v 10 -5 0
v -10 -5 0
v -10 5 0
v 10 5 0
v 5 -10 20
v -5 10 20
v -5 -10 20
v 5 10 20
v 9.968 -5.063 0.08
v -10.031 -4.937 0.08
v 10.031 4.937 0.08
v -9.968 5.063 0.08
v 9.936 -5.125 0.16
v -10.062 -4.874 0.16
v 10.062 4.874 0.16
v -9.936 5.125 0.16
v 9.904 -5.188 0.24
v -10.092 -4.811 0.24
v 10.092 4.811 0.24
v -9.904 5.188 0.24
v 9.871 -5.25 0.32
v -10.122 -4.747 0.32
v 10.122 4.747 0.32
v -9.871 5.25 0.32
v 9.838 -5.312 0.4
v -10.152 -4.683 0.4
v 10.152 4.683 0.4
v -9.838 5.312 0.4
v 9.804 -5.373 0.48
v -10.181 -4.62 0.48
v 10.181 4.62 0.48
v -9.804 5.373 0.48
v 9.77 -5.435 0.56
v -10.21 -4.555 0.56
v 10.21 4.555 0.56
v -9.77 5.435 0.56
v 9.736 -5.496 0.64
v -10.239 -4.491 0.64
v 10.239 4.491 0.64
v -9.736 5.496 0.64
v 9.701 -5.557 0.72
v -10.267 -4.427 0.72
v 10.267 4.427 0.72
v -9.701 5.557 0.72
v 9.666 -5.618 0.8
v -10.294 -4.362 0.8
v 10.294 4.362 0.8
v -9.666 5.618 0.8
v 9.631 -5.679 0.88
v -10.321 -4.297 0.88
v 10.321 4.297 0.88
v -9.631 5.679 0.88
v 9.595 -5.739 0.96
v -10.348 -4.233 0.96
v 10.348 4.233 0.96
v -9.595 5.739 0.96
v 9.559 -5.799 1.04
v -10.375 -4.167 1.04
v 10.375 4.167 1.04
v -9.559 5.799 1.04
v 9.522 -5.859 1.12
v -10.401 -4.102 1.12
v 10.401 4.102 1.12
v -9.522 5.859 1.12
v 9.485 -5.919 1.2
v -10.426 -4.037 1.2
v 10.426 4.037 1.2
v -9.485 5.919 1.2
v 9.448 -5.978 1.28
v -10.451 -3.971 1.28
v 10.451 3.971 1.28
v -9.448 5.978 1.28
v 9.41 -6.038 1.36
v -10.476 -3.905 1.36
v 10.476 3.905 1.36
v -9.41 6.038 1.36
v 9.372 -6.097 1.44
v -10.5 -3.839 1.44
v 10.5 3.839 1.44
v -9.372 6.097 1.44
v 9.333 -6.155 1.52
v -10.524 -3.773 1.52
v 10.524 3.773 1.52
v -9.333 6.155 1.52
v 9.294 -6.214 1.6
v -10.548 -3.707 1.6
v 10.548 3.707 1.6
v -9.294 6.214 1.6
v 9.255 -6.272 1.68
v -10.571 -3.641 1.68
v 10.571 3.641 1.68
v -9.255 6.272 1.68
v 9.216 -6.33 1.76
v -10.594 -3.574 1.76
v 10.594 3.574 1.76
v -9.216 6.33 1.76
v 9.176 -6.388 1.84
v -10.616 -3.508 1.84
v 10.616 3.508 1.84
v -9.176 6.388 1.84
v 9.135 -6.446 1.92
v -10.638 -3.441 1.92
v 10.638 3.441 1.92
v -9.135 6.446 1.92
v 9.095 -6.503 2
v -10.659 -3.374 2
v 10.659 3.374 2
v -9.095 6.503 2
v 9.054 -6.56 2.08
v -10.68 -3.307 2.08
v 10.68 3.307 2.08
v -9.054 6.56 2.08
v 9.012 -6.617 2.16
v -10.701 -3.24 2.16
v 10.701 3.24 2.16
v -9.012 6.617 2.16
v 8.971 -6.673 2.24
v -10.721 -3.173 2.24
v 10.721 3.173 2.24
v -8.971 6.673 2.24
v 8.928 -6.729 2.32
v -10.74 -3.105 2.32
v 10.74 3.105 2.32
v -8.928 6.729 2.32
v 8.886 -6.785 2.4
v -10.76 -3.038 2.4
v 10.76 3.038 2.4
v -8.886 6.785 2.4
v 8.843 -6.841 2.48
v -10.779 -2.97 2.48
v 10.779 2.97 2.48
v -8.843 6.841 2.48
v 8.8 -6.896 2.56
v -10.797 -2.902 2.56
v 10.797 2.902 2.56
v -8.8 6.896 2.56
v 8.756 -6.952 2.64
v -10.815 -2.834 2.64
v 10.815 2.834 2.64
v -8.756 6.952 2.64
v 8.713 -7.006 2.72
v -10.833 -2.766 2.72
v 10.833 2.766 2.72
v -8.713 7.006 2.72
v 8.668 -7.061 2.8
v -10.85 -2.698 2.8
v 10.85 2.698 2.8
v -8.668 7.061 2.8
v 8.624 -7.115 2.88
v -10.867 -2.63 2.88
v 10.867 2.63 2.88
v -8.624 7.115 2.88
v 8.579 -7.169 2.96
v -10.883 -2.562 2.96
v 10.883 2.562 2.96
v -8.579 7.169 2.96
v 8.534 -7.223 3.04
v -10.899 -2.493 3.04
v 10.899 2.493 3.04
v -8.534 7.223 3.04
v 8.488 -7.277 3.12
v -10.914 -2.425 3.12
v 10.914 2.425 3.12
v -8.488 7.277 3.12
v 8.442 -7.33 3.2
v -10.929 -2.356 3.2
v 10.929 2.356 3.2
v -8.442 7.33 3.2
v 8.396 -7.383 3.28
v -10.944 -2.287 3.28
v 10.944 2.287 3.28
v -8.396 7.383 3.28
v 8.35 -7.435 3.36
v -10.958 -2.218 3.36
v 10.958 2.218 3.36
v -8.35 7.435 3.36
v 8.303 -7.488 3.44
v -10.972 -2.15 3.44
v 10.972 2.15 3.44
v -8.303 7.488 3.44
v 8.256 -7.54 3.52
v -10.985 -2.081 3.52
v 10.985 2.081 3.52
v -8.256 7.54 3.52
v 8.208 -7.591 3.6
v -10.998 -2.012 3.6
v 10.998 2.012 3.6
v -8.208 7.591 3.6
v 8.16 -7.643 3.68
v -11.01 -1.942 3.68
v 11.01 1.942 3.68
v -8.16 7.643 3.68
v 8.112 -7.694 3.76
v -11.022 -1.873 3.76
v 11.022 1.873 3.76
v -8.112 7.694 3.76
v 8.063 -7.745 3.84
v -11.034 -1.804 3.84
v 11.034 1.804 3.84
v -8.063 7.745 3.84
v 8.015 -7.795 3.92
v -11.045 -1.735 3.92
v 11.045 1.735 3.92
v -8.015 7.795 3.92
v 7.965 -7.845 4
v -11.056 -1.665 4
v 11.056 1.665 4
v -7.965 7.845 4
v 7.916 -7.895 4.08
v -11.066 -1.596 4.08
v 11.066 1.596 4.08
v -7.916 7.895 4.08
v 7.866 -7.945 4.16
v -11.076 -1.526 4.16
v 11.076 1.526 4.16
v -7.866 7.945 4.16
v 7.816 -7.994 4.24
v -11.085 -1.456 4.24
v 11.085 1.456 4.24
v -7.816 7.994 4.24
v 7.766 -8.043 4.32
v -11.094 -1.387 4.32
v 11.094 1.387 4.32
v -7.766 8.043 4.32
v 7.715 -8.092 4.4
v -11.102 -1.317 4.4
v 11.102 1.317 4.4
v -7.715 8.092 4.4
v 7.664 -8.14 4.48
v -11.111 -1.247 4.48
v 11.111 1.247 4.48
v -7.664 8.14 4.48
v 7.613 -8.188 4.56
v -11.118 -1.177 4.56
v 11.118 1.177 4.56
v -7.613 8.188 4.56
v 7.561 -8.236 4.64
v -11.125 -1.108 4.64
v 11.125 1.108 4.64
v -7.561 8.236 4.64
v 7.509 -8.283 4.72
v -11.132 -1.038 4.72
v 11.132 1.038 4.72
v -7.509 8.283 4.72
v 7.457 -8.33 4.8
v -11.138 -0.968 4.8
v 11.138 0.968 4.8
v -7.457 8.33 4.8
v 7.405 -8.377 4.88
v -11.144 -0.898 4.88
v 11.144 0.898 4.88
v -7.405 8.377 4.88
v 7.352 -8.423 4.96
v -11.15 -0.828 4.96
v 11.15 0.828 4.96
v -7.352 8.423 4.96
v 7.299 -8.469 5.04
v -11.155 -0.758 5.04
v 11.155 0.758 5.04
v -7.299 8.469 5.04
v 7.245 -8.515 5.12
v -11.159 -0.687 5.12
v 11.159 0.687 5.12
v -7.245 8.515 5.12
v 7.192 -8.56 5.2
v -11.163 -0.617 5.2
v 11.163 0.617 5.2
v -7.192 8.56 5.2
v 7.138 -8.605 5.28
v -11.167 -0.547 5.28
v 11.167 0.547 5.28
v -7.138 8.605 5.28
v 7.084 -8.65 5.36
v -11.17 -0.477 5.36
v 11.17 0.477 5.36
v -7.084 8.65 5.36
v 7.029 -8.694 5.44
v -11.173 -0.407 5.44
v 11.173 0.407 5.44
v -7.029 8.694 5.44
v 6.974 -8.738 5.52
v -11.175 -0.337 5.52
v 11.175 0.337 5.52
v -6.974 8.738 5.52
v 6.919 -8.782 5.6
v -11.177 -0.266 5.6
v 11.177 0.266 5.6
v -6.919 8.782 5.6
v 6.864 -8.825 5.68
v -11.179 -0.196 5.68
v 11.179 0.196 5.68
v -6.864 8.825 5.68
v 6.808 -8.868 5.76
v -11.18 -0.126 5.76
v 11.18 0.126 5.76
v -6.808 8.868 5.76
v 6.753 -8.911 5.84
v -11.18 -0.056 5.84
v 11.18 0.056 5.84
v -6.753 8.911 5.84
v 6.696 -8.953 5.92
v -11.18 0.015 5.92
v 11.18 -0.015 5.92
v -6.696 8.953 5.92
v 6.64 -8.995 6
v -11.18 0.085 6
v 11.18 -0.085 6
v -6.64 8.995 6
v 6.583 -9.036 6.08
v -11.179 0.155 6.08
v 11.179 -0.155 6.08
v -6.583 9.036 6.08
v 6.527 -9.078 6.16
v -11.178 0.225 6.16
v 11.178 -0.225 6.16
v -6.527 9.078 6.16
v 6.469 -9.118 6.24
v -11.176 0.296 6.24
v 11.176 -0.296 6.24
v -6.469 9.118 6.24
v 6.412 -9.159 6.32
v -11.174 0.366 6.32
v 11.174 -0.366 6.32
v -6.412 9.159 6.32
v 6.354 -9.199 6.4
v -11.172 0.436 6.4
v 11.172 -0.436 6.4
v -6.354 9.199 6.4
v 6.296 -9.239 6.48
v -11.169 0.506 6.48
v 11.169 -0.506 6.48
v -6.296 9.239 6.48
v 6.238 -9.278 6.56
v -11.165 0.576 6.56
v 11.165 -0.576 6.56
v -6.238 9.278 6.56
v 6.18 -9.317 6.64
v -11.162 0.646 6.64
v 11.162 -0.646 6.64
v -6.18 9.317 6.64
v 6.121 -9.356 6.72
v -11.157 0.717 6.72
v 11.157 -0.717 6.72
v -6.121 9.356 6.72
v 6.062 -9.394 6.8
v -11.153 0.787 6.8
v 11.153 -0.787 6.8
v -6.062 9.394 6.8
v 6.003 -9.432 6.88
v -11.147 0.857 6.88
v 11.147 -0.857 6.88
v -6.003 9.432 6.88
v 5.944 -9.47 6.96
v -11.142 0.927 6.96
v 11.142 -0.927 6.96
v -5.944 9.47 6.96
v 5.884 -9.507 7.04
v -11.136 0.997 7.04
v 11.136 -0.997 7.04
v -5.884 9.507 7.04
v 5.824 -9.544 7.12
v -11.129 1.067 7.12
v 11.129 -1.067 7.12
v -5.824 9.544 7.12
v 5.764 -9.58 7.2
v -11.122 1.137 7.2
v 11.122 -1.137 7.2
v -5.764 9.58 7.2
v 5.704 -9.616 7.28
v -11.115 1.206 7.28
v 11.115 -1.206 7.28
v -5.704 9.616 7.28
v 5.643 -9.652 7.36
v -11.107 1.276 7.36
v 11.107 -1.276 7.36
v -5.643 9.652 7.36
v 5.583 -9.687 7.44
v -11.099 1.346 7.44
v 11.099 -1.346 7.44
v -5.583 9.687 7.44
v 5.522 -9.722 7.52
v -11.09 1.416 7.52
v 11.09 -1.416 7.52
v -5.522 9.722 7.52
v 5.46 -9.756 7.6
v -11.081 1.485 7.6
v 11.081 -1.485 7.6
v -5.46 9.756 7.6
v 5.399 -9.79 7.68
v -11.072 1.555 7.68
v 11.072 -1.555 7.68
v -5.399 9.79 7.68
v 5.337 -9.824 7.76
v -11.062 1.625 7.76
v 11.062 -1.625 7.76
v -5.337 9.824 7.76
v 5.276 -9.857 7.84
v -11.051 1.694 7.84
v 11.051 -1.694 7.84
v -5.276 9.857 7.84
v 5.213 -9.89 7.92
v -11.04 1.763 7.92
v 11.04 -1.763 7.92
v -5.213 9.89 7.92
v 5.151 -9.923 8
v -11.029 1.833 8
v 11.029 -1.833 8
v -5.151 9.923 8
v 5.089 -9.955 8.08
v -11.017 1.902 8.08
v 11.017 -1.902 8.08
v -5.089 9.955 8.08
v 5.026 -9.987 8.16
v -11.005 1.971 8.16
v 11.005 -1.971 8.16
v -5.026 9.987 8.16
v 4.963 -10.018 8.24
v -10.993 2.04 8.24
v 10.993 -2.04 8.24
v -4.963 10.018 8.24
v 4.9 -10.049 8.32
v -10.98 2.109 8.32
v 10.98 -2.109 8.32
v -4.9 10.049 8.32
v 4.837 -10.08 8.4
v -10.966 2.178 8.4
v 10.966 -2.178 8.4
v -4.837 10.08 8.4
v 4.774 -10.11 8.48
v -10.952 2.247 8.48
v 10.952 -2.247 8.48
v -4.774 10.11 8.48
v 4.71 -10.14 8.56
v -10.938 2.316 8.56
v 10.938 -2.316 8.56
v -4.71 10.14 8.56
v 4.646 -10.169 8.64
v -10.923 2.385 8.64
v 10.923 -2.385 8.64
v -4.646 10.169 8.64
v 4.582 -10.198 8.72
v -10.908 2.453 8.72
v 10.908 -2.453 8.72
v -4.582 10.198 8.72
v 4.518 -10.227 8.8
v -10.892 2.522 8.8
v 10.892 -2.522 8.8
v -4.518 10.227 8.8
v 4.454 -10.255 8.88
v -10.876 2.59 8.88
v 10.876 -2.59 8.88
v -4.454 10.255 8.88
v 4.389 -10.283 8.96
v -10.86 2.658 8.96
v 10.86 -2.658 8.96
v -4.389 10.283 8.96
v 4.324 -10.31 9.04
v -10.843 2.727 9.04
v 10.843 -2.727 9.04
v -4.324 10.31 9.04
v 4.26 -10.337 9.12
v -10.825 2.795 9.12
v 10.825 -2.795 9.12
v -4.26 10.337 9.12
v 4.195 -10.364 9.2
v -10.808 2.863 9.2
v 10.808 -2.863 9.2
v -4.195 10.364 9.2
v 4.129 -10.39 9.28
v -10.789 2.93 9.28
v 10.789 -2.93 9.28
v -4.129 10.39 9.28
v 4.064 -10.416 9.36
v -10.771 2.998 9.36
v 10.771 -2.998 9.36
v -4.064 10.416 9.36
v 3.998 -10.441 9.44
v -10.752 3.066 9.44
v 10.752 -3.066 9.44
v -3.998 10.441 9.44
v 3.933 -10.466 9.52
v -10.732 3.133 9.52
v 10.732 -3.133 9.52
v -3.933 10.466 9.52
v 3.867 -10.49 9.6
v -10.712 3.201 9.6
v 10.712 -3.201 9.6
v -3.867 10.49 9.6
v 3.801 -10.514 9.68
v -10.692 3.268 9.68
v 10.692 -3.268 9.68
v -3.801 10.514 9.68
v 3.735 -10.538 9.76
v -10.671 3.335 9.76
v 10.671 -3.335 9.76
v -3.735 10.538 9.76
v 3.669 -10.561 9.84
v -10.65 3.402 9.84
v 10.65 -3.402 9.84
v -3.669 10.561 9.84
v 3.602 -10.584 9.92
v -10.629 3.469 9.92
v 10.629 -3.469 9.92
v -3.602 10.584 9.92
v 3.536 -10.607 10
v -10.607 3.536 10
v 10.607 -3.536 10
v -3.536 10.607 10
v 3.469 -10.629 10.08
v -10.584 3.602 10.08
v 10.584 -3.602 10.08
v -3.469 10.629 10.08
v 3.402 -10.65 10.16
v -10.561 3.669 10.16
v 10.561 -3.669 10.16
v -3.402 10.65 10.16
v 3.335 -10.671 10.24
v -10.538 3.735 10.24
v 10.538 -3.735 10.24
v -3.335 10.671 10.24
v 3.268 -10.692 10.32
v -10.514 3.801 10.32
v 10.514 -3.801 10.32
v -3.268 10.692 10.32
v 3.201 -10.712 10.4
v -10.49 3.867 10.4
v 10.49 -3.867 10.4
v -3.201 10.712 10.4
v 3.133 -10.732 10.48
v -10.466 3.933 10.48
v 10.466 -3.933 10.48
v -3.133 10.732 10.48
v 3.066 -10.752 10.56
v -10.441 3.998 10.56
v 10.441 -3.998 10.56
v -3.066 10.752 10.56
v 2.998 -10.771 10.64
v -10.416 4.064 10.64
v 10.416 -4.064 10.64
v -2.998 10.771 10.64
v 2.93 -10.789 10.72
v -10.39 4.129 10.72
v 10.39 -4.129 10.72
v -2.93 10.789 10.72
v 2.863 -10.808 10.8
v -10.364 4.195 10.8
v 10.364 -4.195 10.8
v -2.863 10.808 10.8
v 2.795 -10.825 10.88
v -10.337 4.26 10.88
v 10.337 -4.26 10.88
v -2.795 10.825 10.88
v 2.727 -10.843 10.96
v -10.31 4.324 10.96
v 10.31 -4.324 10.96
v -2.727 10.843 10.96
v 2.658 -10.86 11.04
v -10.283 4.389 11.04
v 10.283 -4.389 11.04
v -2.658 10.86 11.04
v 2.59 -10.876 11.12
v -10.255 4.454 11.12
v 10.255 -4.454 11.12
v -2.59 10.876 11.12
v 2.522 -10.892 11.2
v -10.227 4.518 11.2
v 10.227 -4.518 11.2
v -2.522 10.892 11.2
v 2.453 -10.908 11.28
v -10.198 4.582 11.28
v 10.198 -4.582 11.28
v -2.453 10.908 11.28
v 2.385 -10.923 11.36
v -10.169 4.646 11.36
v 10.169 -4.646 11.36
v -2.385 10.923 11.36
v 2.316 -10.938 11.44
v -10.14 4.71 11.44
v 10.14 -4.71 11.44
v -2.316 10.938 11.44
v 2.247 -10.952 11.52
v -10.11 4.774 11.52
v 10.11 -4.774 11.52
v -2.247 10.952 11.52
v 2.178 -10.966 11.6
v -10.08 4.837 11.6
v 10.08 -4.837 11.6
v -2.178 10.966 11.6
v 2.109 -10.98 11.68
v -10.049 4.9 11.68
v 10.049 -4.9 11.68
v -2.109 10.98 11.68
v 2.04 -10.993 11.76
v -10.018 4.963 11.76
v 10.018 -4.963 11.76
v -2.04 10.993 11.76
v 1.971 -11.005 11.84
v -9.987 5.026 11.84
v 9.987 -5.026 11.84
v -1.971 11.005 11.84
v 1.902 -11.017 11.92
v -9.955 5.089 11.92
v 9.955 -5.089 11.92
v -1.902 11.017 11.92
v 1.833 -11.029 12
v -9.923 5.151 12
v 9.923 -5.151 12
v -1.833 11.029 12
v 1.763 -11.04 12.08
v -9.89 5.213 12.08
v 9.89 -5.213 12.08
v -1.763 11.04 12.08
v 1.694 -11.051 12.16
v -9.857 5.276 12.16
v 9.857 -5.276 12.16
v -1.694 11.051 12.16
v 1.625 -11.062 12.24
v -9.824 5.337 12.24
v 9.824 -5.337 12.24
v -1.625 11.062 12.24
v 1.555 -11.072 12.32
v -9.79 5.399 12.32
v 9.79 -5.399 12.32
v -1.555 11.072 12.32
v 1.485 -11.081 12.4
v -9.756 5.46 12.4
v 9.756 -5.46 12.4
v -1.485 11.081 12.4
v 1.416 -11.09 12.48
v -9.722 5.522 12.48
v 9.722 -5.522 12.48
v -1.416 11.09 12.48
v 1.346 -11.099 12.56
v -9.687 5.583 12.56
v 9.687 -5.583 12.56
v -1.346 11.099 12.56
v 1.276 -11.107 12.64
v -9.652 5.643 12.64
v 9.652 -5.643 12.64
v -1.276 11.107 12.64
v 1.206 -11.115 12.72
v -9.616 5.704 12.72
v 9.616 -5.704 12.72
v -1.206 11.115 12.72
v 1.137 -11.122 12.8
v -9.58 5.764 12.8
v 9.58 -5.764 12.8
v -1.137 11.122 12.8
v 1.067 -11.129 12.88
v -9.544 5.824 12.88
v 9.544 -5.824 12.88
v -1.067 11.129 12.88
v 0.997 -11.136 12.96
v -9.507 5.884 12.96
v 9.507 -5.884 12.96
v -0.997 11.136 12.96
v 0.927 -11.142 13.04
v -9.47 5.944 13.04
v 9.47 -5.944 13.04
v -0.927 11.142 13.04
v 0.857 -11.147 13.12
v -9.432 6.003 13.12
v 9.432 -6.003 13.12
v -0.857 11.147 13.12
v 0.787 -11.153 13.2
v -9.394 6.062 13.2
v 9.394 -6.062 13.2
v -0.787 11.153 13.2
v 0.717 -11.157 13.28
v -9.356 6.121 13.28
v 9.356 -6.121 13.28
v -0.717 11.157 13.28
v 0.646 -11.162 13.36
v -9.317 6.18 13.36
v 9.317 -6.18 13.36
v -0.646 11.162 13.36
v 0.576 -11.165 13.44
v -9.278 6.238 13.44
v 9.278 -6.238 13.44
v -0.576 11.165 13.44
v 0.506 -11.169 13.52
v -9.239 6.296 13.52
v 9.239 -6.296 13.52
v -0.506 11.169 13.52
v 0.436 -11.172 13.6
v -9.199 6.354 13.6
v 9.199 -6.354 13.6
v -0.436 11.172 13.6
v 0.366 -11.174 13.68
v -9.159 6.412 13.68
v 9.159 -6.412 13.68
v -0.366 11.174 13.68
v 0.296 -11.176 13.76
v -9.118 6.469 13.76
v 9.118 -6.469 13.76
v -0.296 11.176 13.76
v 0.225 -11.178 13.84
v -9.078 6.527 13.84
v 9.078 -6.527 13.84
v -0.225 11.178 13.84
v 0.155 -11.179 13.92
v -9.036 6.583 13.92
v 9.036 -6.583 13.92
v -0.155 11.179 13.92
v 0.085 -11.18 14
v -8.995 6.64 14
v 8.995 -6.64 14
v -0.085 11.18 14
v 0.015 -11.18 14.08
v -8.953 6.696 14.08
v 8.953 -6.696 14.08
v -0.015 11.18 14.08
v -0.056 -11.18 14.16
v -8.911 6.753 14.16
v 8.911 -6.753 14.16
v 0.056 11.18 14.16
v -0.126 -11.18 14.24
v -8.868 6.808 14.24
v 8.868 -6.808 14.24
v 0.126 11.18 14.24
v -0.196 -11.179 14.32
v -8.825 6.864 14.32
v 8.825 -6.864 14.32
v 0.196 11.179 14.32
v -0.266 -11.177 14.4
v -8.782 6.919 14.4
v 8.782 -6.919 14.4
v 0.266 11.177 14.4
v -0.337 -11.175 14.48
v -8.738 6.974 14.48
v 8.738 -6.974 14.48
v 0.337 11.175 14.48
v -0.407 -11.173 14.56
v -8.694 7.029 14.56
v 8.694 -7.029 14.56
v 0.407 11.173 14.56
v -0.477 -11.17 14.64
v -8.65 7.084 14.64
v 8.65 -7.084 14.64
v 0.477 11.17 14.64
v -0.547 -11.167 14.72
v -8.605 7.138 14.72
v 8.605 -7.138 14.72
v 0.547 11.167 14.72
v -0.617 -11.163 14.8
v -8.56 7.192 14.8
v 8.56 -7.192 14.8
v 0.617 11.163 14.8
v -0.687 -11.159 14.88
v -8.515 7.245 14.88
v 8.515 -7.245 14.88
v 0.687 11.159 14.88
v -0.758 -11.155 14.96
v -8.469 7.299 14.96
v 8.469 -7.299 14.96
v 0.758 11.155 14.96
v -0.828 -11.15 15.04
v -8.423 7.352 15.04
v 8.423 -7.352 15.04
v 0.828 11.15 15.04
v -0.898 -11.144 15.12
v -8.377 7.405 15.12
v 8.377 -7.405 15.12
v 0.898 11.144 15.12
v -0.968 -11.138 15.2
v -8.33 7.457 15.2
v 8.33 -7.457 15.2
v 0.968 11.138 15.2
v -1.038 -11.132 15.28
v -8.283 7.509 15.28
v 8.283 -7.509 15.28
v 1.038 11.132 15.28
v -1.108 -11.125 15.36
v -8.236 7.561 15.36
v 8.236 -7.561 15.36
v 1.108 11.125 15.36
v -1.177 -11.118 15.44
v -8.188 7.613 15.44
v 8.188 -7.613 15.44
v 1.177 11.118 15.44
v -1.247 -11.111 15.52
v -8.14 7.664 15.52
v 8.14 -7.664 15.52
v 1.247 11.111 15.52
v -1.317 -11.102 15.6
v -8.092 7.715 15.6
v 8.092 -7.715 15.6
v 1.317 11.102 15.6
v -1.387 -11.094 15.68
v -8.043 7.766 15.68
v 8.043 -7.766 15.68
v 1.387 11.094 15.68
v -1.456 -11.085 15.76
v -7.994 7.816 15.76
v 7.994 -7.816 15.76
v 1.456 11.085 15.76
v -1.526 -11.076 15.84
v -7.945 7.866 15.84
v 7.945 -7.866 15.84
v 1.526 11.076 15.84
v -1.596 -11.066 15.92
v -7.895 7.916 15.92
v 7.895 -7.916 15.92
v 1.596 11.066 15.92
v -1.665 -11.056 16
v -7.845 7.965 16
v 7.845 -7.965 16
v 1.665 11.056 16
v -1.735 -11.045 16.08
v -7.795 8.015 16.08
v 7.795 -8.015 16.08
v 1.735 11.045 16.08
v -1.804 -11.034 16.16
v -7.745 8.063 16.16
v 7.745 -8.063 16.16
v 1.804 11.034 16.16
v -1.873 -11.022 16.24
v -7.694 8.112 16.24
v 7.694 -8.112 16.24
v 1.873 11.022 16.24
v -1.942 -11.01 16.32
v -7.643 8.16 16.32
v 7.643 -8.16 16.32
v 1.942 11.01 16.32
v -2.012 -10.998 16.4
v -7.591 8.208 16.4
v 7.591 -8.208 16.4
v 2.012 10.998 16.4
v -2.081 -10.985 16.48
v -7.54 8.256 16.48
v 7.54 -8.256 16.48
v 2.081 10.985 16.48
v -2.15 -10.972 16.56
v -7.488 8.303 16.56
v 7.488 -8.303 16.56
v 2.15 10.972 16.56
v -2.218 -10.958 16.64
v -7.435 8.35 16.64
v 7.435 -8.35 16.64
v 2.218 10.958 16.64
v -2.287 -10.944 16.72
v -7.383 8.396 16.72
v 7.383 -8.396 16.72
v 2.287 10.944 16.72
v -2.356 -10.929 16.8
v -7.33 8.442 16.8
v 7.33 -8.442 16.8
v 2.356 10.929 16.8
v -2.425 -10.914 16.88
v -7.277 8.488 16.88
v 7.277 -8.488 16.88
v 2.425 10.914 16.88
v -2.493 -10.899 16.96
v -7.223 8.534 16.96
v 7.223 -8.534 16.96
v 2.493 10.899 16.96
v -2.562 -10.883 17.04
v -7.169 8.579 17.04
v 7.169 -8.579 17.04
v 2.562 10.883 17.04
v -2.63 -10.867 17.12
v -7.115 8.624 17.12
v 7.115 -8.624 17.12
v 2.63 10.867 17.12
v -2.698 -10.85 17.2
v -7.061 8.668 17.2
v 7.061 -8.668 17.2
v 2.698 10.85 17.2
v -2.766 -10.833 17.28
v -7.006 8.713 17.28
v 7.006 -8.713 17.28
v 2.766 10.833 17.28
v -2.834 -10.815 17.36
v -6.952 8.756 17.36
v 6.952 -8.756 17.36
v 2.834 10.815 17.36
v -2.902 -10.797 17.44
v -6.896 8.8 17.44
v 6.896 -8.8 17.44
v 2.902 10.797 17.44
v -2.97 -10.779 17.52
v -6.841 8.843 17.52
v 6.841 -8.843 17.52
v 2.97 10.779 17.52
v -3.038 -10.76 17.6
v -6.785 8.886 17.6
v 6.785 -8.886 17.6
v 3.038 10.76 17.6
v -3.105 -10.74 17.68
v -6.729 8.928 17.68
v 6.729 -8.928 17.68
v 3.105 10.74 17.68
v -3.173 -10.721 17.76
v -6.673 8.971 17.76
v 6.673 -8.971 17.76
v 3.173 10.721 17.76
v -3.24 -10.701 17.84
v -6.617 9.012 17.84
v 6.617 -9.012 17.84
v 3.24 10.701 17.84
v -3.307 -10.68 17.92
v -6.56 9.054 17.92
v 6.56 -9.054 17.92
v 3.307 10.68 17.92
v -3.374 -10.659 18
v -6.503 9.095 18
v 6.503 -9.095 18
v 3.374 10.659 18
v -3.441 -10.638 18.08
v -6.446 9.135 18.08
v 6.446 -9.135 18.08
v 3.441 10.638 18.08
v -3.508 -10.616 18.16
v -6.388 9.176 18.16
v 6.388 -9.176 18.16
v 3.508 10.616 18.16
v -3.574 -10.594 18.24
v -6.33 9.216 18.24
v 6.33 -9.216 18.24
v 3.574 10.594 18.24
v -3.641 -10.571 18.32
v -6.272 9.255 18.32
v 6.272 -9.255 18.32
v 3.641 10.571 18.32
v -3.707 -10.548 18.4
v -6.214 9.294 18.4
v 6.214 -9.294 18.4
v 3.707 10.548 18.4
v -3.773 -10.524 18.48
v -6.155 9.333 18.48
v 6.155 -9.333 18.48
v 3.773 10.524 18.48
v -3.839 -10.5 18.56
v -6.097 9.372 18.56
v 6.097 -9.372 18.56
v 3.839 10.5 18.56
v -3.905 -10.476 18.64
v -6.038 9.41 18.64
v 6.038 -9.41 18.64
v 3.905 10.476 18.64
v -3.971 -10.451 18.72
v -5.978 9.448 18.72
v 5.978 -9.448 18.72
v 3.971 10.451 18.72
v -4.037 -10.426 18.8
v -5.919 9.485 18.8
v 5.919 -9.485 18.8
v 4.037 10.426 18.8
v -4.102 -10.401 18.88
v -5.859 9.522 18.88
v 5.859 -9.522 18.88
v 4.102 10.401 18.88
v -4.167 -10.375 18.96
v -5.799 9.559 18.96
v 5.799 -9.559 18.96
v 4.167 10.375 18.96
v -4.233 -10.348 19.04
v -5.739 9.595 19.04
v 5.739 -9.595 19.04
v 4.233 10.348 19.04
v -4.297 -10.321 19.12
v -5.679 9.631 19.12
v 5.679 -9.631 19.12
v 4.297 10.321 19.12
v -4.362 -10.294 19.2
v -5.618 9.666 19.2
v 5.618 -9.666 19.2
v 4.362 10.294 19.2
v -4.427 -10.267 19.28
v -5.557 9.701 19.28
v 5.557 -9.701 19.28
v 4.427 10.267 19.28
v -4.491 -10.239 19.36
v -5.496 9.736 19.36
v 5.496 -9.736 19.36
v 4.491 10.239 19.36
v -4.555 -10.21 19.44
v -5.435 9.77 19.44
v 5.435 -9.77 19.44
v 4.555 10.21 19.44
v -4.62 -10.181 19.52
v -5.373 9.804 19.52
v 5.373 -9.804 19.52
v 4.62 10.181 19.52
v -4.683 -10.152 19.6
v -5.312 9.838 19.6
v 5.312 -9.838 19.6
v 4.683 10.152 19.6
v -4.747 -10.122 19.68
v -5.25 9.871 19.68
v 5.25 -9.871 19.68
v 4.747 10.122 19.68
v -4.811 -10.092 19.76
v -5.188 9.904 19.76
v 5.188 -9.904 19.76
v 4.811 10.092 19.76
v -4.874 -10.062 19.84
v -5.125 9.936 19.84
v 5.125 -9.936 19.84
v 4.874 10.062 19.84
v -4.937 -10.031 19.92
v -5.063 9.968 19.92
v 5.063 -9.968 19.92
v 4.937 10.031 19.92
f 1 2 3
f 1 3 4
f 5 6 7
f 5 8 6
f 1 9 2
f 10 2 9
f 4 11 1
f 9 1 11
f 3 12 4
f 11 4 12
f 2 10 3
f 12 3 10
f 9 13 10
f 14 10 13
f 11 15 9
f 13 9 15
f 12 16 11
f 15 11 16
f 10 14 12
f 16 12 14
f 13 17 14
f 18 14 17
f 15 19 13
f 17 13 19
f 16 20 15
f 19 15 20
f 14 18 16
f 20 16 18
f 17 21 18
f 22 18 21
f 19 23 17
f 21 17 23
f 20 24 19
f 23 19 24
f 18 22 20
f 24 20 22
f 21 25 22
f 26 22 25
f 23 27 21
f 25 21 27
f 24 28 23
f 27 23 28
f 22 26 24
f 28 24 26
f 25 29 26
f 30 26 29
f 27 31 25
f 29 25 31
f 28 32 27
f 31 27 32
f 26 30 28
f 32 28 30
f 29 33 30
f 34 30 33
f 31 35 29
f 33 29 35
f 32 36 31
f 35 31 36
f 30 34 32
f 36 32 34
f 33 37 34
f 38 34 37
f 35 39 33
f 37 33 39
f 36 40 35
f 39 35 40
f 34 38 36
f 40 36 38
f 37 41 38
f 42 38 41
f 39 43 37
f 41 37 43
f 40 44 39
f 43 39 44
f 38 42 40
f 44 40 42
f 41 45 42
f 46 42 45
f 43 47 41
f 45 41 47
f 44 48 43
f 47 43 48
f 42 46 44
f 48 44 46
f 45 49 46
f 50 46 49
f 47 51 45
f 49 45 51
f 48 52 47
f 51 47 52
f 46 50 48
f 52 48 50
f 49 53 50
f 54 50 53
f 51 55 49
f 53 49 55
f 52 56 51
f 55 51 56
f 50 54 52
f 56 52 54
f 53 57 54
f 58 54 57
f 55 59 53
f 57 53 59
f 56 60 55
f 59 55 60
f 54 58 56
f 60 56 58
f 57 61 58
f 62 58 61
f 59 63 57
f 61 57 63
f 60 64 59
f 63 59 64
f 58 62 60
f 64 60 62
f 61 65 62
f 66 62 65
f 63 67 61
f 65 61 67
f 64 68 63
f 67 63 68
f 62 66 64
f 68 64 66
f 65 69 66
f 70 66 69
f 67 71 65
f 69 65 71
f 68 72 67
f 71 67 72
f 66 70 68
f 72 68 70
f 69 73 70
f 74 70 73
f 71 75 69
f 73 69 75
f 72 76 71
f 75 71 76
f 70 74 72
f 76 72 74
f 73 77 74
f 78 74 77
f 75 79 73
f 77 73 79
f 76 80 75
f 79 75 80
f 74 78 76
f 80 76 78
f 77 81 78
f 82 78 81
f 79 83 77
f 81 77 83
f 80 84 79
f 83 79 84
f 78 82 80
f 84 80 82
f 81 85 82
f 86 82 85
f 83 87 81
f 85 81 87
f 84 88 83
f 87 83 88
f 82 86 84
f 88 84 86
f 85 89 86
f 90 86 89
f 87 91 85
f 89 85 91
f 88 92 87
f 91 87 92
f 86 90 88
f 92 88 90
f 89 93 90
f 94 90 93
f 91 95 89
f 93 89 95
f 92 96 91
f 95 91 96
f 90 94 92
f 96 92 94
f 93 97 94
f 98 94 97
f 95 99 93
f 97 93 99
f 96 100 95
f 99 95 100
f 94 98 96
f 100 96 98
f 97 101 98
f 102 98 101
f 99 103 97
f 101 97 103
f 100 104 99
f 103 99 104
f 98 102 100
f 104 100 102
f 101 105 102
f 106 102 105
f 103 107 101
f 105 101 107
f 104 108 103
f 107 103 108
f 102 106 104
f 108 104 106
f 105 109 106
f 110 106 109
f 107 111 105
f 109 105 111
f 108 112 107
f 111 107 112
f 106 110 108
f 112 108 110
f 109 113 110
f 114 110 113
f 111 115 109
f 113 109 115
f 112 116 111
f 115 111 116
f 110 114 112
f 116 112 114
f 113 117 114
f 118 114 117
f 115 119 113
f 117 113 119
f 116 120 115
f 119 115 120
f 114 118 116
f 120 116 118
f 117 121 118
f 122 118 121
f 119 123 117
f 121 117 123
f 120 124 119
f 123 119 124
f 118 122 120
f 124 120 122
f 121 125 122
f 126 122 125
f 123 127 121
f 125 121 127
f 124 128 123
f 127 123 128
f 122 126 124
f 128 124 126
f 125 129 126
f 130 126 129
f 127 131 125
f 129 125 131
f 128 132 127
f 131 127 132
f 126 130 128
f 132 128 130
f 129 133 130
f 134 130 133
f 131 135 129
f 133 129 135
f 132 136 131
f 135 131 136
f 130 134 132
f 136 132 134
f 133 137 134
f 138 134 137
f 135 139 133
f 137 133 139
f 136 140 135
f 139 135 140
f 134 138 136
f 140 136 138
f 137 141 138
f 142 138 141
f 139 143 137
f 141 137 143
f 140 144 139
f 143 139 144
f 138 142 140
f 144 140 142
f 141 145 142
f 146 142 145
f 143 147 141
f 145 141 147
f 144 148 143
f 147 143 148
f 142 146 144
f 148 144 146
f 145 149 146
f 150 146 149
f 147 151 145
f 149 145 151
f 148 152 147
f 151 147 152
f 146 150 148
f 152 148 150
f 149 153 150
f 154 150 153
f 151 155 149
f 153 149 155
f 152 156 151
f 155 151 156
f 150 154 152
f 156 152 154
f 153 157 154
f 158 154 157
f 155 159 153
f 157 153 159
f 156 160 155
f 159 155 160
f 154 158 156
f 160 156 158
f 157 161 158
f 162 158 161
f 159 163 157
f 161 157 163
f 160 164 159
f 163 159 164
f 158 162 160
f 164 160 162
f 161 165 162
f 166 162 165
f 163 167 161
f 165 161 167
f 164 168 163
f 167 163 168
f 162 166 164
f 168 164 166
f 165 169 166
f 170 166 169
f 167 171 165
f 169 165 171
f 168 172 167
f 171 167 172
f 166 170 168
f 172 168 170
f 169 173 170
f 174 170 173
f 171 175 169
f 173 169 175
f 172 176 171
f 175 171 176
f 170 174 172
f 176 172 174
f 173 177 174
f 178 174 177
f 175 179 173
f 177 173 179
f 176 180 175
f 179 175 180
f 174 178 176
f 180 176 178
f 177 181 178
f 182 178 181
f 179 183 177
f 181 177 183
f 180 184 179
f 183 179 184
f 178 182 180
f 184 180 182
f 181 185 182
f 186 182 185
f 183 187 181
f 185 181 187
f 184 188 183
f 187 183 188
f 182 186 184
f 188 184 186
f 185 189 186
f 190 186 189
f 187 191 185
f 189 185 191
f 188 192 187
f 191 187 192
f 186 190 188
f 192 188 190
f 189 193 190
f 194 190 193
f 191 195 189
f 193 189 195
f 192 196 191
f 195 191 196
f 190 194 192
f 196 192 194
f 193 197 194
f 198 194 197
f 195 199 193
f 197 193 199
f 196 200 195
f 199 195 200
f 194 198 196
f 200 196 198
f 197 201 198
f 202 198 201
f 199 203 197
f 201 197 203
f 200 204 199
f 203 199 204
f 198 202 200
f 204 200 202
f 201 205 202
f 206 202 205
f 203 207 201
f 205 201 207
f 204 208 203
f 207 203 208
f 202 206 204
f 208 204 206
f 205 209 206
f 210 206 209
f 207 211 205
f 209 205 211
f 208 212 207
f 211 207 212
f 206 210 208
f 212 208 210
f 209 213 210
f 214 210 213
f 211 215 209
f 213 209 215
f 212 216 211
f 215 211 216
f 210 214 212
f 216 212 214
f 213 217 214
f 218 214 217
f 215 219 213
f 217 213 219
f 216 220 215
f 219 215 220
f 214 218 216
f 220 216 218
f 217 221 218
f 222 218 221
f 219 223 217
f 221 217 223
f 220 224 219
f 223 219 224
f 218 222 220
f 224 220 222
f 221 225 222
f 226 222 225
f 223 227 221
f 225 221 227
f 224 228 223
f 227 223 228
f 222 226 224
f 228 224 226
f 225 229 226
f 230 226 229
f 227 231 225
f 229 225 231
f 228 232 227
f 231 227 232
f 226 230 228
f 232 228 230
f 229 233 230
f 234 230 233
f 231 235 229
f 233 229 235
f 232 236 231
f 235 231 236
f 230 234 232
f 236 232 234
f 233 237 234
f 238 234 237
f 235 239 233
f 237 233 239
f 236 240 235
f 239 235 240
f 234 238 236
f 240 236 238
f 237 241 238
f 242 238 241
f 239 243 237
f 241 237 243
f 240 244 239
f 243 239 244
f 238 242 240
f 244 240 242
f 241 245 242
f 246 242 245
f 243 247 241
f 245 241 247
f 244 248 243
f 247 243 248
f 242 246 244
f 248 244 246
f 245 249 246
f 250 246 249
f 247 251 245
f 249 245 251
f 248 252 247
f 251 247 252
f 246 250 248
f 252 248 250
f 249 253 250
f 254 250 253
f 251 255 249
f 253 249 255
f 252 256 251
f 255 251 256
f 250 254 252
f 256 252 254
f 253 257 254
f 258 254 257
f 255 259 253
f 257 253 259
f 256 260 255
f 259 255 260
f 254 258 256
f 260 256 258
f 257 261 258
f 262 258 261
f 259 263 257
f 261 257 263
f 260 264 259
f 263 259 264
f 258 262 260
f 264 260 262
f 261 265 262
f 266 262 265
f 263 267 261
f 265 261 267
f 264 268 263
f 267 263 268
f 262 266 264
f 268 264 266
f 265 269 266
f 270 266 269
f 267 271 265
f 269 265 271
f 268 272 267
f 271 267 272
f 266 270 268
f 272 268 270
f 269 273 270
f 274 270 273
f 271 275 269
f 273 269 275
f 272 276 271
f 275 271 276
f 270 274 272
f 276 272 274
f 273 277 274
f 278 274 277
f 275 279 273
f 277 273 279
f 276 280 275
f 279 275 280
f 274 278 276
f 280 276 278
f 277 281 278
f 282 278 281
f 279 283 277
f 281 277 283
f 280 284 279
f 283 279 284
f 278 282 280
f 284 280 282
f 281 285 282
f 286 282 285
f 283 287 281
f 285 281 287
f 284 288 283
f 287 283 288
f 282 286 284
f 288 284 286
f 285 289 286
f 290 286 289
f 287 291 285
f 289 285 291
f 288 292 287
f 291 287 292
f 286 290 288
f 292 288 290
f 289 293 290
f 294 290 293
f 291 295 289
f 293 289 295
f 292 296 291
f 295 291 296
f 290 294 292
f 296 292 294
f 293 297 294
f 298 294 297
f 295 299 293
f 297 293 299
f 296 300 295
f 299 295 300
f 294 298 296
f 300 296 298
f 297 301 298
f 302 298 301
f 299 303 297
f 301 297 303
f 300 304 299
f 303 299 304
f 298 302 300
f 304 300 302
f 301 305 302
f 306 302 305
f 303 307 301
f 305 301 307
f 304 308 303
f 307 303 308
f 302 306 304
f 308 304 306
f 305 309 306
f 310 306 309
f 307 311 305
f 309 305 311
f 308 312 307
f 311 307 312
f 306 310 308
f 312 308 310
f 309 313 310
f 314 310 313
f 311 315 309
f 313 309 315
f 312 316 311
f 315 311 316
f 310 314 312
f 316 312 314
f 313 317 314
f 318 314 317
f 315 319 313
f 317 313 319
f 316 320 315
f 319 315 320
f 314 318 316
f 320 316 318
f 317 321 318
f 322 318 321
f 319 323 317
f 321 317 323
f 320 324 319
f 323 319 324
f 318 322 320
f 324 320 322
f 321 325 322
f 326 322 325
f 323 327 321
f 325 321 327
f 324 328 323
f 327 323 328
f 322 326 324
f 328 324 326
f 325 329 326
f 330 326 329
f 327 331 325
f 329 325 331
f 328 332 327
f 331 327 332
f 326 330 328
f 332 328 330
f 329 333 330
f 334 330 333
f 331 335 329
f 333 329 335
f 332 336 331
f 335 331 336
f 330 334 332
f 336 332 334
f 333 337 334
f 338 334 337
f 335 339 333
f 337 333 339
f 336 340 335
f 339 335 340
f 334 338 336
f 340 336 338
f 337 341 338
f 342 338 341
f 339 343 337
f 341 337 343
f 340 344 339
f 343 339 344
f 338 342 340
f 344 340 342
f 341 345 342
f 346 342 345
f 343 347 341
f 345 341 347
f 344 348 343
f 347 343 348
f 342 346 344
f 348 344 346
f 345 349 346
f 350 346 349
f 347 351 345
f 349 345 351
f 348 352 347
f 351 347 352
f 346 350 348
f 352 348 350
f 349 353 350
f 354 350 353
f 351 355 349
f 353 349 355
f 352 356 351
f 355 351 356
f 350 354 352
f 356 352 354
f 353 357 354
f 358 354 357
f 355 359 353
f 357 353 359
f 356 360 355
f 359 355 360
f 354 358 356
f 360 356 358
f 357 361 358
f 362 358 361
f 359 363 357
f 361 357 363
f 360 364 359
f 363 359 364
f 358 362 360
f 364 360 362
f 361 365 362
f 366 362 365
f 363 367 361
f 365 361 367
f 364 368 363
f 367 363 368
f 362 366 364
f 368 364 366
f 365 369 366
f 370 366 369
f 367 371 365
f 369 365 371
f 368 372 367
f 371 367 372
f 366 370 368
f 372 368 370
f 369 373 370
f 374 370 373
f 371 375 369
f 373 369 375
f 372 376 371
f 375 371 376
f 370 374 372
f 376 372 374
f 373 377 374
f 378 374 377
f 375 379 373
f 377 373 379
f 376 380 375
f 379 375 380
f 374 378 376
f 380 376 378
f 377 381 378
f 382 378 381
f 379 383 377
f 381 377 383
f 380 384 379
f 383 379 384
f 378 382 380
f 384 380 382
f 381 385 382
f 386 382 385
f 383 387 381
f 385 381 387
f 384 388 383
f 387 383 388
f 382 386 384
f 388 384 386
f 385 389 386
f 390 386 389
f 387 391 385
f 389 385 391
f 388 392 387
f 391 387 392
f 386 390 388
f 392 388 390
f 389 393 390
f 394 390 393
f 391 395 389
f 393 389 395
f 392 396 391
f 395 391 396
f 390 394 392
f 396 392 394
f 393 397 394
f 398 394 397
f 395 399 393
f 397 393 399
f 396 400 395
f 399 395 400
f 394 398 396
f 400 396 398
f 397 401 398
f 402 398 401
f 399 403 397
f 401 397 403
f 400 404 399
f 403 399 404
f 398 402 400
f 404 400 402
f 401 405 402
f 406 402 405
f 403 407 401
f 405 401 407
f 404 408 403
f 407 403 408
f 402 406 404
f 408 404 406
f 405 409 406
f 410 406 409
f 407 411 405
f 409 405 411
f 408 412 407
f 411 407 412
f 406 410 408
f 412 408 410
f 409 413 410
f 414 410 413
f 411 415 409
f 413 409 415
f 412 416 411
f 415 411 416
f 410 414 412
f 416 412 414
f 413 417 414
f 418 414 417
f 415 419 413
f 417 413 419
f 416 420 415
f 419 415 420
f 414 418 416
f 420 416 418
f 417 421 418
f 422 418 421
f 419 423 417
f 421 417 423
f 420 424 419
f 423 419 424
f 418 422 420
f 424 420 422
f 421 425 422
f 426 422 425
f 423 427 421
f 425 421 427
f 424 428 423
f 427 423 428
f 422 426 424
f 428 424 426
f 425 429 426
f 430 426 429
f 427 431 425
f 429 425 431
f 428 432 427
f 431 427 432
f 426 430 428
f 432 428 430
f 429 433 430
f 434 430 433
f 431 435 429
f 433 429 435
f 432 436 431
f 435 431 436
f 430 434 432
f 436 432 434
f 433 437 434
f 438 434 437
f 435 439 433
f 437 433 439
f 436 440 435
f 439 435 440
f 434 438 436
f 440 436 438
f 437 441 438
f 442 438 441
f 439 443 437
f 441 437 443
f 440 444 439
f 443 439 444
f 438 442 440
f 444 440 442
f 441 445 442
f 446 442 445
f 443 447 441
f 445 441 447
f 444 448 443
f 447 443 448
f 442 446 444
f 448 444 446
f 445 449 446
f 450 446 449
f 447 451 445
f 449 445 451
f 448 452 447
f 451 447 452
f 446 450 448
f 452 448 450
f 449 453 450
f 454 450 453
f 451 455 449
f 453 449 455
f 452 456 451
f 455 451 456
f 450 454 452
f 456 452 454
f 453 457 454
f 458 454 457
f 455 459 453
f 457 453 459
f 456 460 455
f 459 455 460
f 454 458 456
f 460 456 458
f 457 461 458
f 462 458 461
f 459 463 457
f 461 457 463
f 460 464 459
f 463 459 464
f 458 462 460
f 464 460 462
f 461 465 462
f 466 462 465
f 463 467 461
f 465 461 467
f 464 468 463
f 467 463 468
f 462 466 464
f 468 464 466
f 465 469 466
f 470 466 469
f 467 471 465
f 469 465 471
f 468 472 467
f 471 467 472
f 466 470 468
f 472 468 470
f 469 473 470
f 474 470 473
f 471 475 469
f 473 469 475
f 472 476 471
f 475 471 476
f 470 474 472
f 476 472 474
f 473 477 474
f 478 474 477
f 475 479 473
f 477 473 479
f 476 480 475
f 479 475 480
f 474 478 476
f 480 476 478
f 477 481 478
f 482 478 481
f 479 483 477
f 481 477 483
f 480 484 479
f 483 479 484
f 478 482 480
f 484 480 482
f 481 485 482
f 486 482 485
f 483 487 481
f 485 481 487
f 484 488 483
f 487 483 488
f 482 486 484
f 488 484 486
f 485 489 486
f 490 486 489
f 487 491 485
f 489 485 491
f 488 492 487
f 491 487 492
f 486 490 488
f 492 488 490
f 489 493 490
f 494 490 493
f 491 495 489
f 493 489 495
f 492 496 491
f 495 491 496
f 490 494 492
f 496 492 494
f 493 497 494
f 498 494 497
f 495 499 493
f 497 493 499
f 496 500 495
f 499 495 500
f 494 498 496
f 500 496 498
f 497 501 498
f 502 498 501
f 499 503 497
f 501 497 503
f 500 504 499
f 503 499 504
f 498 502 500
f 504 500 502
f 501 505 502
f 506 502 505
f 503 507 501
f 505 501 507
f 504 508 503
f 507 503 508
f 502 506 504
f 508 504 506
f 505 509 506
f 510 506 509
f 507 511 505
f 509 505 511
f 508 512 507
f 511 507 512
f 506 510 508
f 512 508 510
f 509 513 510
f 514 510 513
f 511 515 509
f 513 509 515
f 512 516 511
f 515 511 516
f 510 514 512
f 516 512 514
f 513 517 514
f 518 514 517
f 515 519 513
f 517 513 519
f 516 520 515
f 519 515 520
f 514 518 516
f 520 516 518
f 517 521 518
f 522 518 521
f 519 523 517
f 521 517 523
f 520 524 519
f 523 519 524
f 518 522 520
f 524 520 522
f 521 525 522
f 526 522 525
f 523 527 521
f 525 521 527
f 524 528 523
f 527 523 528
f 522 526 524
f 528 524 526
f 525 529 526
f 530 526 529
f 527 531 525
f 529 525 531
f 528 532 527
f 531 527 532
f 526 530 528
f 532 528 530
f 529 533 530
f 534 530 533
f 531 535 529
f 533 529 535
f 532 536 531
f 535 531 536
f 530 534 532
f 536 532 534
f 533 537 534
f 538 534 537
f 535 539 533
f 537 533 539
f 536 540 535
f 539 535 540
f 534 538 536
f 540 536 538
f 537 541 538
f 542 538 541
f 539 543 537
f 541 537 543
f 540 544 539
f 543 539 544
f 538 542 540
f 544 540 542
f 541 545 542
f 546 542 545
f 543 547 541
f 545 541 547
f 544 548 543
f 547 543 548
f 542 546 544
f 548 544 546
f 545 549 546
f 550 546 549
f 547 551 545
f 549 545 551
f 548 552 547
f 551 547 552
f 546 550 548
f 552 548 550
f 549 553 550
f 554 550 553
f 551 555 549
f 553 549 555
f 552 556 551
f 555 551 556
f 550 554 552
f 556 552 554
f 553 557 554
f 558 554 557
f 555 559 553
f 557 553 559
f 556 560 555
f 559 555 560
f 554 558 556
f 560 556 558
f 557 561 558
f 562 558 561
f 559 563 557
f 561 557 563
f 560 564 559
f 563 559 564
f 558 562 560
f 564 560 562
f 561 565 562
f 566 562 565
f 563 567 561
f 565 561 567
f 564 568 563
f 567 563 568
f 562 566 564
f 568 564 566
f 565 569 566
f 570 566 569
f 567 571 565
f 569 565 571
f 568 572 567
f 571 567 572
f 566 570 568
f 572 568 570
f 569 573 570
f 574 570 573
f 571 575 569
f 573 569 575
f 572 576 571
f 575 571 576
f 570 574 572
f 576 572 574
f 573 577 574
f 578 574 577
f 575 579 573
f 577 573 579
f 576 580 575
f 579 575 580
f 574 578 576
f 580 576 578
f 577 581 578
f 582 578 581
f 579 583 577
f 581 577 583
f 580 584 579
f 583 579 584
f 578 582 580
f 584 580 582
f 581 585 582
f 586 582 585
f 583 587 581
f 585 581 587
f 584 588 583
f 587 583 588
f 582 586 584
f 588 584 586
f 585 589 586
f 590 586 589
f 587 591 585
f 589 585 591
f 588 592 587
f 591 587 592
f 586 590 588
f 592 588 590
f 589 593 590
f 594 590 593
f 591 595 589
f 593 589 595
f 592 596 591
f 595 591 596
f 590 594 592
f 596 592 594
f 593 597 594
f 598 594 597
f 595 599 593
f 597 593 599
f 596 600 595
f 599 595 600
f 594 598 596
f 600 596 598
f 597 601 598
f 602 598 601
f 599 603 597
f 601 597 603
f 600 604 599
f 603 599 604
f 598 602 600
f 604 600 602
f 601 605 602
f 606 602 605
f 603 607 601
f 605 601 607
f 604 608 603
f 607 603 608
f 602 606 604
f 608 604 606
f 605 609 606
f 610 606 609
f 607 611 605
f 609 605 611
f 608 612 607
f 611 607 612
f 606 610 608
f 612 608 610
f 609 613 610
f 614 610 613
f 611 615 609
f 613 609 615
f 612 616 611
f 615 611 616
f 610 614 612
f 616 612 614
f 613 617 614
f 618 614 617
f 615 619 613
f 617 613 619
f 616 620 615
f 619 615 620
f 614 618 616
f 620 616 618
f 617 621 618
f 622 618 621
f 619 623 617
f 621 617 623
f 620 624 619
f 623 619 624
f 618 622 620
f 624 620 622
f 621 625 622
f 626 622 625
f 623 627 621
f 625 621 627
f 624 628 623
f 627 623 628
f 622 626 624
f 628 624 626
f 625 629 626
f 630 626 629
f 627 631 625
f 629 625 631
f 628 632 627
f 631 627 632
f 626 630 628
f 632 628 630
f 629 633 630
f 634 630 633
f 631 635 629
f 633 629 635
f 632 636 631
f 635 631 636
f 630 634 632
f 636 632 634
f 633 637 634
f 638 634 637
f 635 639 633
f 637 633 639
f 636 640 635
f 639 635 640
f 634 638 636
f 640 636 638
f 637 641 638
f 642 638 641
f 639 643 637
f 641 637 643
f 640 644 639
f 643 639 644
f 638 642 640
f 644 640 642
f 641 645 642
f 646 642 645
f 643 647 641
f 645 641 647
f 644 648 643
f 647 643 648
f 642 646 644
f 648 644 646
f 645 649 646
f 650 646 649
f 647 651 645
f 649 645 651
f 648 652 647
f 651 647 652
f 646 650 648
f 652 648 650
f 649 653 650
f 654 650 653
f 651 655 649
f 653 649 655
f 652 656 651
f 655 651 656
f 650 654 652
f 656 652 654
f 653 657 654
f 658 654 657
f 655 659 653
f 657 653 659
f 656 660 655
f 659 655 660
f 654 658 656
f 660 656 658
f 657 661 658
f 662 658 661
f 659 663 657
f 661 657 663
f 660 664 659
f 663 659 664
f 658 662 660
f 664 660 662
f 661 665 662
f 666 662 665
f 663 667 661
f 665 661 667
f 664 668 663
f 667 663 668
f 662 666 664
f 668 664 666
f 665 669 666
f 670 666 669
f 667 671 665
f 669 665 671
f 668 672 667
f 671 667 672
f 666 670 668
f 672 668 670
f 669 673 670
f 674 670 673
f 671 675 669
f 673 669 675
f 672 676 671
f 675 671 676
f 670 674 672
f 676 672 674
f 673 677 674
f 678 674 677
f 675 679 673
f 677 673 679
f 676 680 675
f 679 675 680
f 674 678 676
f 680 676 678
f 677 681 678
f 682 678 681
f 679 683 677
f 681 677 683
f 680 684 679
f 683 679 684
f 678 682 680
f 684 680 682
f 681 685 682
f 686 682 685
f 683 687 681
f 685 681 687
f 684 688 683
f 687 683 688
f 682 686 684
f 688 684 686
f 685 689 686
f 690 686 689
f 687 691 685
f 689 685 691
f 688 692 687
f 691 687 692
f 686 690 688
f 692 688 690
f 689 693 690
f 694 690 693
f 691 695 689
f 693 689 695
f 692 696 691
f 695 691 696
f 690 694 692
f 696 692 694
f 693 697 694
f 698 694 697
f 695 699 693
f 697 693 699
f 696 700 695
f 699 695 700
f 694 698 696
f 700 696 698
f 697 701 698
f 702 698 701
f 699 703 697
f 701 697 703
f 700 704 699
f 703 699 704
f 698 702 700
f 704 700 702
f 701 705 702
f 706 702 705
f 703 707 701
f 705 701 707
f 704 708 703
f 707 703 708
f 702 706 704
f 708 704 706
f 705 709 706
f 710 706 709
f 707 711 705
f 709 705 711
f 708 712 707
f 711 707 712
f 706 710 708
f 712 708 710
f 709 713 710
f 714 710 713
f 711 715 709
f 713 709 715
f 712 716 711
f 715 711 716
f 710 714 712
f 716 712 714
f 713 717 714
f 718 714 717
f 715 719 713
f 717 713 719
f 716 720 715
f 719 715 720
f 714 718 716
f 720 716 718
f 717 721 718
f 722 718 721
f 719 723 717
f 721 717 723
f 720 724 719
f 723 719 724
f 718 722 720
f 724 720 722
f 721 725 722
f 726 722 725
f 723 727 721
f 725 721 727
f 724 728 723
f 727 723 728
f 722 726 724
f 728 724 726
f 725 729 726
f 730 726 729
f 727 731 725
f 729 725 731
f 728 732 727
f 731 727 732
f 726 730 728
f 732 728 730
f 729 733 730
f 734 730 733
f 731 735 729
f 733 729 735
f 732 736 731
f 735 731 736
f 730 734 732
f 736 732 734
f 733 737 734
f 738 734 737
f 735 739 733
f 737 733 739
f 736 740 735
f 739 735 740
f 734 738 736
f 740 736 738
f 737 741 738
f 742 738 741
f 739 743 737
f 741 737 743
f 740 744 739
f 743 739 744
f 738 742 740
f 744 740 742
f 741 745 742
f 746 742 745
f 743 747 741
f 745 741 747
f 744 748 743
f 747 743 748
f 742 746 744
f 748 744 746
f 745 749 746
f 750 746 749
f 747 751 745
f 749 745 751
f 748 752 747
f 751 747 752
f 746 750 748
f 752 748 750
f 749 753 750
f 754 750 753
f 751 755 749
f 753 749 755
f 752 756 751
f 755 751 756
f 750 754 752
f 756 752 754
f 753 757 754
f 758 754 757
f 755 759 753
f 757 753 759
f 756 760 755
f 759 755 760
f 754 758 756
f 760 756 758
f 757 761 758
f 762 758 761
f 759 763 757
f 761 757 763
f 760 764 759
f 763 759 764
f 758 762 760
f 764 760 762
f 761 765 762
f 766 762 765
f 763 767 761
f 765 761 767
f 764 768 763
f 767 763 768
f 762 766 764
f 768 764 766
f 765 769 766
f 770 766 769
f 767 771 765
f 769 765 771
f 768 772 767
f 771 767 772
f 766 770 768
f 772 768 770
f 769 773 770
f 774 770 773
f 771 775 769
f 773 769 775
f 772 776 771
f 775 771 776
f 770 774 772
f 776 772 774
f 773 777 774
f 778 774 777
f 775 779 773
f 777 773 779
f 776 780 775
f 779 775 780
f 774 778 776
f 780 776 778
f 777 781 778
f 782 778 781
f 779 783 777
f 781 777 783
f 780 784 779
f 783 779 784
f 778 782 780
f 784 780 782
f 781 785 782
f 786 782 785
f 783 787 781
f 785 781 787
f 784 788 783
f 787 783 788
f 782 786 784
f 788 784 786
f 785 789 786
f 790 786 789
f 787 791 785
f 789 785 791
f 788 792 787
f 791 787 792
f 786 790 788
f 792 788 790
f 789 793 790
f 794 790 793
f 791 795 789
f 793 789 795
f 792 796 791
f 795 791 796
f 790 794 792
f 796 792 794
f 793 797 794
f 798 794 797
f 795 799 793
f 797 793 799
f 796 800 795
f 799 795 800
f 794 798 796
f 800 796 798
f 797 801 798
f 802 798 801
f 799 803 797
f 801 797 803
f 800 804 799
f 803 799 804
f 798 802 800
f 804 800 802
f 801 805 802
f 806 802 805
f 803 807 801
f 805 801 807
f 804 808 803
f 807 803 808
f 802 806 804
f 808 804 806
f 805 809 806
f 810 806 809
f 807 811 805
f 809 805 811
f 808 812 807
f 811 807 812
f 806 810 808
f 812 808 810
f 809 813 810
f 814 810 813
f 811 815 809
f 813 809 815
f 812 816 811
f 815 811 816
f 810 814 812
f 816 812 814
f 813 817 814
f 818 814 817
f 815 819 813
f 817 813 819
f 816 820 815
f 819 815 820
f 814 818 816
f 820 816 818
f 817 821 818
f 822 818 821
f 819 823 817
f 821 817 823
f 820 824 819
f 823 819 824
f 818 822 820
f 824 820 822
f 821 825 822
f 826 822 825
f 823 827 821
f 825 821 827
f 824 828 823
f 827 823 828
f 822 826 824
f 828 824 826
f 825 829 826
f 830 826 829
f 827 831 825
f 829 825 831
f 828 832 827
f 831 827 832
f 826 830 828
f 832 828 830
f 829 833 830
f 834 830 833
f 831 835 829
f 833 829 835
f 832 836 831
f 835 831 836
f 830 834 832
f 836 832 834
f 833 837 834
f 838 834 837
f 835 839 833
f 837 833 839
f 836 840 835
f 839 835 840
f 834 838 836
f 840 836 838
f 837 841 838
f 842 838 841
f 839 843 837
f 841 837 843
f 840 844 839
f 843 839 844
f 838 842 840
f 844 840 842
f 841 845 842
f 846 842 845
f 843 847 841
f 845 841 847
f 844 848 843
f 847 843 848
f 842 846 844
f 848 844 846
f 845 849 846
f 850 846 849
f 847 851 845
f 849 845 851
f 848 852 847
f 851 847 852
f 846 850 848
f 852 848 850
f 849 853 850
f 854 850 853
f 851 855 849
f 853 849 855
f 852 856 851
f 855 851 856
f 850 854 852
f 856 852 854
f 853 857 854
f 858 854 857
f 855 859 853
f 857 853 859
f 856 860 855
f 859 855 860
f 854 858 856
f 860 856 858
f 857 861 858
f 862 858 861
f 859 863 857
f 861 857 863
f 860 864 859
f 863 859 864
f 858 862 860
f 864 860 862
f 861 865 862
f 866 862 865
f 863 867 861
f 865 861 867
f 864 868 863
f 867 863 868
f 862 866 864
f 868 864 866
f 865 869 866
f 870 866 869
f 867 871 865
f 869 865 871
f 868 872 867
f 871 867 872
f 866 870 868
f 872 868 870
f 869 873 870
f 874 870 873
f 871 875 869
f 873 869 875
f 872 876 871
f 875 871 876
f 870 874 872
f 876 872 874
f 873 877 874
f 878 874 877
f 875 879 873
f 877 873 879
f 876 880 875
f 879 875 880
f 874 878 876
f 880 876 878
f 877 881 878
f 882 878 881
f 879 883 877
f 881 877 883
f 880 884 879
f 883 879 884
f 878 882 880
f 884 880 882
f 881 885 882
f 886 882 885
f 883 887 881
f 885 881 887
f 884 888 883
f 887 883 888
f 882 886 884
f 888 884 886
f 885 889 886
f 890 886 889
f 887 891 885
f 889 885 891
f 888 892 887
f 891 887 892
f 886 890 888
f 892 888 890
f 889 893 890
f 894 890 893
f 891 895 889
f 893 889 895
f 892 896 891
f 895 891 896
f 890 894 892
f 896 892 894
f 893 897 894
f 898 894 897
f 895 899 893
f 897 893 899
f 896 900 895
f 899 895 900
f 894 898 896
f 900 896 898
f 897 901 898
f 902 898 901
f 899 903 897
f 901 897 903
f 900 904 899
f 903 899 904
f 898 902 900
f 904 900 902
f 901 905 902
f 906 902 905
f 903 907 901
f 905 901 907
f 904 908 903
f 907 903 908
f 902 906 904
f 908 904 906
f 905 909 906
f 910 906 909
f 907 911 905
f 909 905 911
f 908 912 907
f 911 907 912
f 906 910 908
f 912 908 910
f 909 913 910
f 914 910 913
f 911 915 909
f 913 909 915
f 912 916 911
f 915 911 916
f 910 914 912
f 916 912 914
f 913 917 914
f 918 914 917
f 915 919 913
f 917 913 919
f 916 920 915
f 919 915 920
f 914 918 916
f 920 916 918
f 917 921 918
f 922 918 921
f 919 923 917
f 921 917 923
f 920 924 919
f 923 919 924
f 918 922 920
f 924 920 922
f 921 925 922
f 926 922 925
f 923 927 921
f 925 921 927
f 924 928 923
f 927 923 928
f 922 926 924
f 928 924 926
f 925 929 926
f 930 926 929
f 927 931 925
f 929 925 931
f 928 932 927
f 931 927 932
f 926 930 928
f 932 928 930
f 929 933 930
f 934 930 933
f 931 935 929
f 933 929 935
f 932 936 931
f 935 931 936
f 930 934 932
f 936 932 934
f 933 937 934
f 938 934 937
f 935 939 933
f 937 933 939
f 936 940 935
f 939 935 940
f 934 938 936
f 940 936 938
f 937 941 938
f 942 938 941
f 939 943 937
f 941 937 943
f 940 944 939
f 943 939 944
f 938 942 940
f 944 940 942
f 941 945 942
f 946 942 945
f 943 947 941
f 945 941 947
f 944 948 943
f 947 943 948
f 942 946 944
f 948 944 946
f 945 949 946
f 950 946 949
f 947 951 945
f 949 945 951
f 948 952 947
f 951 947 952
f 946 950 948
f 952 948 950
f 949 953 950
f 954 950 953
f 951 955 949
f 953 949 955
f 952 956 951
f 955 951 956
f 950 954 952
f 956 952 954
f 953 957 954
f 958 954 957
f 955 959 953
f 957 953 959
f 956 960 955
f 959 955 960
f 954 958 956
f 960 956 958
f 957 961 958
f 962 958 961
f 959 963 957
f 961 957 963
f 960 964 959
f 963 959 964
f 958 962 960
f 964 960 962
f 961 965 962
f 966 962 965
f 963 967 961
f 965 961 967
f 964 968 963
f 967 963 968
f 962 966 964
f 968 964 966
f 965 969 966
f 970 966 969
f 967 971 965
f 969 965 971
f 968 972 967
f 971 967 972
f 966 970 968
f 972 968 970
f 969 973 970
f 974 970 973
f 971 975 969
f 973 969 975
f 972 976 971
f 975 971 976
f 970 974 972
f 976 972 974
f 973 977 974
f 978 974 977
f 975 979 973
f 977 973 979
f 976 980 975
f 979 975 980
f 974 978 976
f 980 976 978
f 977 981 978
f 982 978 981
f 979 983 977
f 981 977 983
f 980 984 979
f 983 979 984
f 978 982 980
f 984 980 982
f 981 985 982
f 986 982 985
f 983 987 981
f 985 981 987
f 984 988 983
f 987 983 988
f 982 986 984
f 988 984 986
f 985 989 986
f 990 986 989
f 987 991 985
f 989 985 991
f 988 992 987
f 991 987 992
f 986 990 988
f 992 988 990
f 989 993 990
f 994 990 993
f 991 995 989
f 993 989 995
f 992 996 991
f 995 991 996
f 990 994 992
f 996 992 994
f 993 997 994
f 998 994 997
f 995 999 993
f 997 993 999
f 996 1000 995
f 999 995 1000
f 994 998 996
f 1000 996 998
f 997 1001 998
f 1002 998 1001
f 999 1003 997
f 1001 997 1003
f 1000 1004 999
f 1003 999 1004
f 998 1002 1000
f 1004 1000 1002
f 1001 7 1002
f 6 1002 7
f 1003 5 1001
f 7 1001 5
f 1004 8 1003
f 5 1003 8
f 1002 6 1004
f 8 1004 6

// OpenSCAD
$fn = 1000;
color("cyan")
    translate([0, 0, 0])
        linear_extrude(height = 20, twist = 90)
            square([20, 10], center = true);
